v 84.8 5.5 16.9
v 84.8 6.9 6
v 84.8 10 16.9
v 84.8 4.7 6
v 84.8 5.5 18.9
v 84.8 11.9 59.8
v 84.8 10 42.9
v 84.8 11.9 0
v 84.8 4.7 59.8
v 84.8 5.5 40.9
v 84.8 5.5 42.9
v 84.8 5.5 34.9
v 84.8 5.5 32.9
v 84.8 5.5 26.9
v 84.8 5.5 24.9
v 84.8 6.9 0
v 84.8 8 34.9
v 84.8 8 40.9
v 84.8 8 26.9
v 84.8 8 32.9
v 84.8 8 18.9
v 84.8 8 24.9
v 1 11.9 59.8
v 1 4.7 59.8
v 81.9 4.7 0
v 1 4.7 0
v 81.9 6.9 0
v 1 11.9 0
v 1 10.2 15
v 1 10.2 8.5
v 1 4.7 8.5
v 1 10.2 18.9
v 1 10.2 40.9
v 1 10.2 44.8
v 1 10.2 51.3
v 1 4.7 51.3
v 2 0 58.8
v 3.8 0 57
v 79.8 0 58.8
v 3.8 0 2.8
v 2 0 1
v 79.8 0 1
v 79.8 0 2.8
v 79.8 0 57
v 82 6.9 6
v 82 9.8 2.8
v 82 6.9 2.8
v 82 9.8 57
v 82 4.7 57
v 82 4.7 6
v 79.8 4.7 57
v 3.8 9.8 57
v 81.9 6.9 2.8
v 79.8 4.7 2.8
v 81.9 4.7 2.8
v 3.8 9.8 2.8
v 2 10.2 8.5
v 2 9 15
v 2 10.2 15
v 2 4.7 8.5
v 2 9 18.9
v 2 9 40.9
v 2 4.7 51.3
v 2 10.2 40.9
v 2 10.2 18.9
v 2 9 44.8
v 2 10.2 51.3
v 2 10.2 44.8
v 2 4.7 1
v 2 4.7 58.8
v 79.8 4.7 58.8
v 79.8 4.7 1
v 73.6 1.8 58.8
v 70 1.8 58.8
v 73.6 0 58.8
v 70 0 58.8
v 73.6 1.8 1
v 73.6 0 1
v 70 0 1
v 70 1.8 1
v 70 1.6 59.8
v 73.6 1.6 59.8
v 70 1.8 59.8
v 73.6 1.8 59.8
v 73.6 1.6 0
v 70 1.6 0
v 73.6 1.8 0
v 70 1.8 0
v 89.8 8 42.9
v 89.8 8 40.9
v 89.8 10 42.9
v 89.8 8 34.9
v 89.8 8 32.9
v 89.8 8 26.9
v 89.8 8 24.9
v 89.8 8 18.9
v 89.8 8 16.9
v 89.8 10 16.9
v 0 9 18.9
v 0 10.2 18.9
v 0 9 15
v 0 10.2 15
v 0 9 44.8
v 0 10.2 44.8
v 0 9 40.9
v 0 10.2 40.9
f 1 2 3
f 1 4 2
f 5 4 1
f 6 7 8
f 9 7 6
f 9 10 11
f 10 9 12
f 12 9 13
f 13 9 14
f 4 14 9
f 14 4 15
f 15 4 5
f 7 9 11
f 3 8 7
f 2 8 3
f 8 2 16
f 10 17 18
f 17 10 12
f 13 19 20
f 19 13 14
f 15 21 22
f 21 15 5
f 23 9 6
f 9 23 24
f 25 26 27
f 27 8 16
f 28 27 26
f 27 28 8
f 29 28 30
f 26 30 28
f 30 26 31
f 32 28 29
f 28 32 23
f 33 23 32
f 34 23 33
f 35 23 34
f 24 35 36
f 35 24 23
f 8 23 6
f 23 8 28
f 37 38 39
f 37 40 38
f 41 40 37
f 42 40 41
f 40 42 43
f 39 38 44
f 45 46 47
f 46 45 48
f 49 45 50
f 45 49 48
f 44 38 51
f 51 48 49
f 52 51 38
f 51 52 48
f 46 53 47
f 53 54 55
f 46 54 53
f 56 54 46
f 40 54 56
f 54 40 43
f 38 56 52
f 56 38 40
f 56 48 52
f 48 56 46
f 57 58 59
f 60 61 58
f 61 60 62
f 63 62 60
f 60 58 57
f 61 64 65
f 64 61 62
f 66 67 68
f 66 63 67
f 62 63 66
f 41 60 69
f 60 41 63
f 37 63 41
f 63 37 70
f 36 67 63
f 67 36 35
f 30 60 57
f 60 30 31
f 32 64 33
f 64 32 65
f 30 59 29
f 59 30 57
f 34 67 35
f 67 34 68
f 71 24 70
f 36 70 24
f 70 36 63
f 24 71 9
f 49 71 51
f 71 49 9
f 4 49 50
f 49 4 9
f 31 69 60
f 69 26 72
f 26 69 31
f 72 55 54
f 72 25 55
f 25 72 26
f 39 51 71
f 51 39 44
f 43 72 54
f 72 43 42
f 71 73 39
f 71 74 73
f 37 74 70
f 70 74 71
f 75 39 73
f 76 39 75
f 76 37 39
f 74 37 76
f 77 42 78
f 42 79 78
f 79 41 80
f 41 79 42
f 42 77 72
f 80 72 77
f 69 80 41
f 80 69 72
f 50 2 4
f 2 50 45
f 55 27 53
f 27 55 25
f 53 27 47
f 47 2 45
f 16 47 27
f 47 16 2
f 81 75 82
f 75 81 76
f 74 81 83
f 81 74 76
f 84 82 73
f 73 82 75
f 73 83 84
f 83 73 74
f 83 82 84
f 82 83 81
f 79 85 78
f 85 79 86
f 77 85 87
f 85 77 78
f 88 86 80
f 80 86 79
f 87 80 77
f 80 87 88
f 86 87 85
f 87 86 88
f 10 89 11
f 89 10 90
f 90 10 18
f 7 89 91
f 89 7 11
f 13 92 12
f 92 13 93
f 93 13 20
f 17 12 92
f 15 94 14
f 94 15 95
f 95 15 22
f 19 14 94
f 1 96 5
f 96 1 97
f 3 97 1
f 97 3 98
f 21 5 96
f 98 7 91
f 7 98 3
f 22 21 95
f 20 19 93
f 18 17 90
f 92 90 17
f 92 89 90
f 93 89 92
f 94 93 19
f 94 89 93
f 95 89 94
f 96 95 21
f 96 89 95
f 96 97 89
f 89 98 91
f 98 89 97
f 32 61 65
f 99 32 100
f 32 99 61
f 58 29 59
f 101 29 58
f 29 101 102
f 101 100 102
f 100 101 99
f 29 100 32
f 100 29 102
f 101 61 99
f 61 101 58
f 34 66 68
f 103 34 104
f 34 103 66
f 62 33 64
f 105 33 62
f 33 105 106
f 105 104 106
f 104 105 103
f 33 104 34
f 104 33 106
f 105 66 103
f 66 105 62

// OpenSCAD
// SCAD model SIMATIC_IoT_2000_2020_2040_left_lid_cover_parametric, http://www.thingiverse.com/thing:2250534
// copyright (c) 2017 by Michael Dreher <michael(a)5dot1.de> is licensed under the Creative Commons - Attribution - Non-Commercial - Share Alike license. http://creativecommons.org/licenses/by-nc-nd/3.0/
// note for me: look at http://customizer.makerbot.com/docs for defining customizable parameters

// extra height for the top perimeter, should be a multiple of 0.2
topExtraHeight = 0; // [0:0.2:100]

// thickness of the top perimeter
topThickness = 2.1; // [0.6:0.2:5]

// thickness of the other perimeters
thickness = 1.8; // [1.2:0.1:3.9]

// if you want a hole for the MH-Z19 CO2 sensor in the top perimeter
withMHZ19SensorHole = 0; // [0:no, 1:top, 2:back, 3:front]

// if you want a hole for the Nokia 5110 LCD or a QVGA TFT display
withDisplay = 0; // [0:no_display, 1:Nokia5110, 2:QVGA]

// if you want a hole for a cable at the front.
withCableHole = 0; // [0:no, 1:yes]

// stop the parametric parser
if(0) {}

// my parameters
//topExtraHeight = 28; topThickness = 2.1; thickness = 1.8; withMHZ19SensorHole = 3; withDisplay = 2; withCableHole = 1;

module Triangle(x, h, overlap, thick)
{
    rotate([0, 90, 0])
    translate([-overlap, overlap, -thick / 2])
    linear_extrude(height = thick)
    polygon(points=[[0, 0], [h + overlap, 0], [h + overlap, -overlap], [overlap, -(x + overlap)], [0, -(x + overlap)]]);
}

module Tongue(x, y, z, thick, supportThick, supportCount=2)
{
    translate([-x/2, -y, -thick]) cube([x, y + overlap, thick]);

    if(supportCount < 2) {
        supportCount = 2;     
    }
    for (i = [0:supportCount - 1]) {
        sx = -(x - supportThick)/2 + i * (x - supportThick) / (supportCount - 1);  
        translate([sx, 0, -thick]) Triangle(y, z - thick, overlap, supportThick);
    }      
}

// the support has the whole width
module TongueSmall(x, y, z, thick)
{
    Tongue(x, y, z, thick, x/2 + overlap, 2);
}

module TongueBig(x, y, z, thick)
{
    Tongue(x, y, z, thick, thick, 4);
}

// originally taken from here: http://www.thingiverse.com/thing:9347
module roundedCube(size, radius)
{
    x = size[0];
    y = size[1];
    z = size[2];

    linear_extrude(height = z)
    hull()
    {
        // place 4 circles in the corners, with the given radius
        translate([radius, radius, 0])         circle(r = radius);
        translate([x - radius, radius, 0])     circle(r = radius);
        translate([radius, y - radius, 0])     circle(r = radius);
        translate([x - radius, y - radius, 0]) circle(r = radius);
    }
}

module Nokia_LCD_5110(thick = 5.1, sink = 0.8)
{
    // hole for the sensor
    center = true;
    top_corner_radius = 3.5;
    top_x = 36.4;
    top_y = 26.2;
    inner_x = 40.5;
    inner_y = 34.2;
    inner_y_dist = 1.4;
    pcb_x = 45.3;
    pcb_y = 45.3;
    pcb_z = 1.2;
    pcb_z_dist = 3.8;
    pcb_y_dist = inner_y_dist + 6;
    //y_dist = (inner_y - top_y) - 1.4;

    translate([center ? -top_x / 2 : 0, center ? -top_y / 2 : 0, 0])
    union()
    {
        //translate([0, 0, -(thick + o)]) cube([top_x, top_y, thick + 2*o]);
        translate([0, 0, -(thick + o)]) roundedCube([top_x, top_y, thick + 2*o], top_corner_radius); // rounded corners
        translate([-(inner_x - top_x) / 2, -inner_y_dist, -(thick + o)]) cube([inner_x, inner_y, thick - sink + o]);
        translate([-(pcb_x - top_x) / 2, -pcb_y_dist, -(pcb_z_dist + pcb_z)]) cube([pcb_x, pcb_y, pcb_z]);
    }
}

module QVGA_TFT(thick = 7.3, sink = 0.8)
{
    // hole for the sensor
    center = true;
    top_corner_radius = 1;
    top_x = 49 - 2;
    top_y = 37 - 2;
    inner_x = 55.4+0.4;
    inner_y = 40.2+0.2;
    inner_x_dist = 5.4 + 1;
    pcb_x = 67.5+0.2;
    pcb_y = 40.5+0.2;
    pcb_z = 1.7;
    pcb_z_dist = 2.6;
    pcb_x_dist = inner_x_dist + 8;

    translate([center ? -top_x / 2 : 0, center ? -top_y / 2 : 0, 0])
    union()
    {
        //translate([0, 0, -(thick + o)]) cube([top_x, top_y, thick + 2*o]);
        translate([0, 0, -(thick + o)]) roundedCube([top_x, top_y, thick + 2*o], top_corner_radius); // rounded corners
        translate([-inner_x_dist, -(inner_y - top_y) / 2, -(thick + o)]) cube([inner_x, inner_y, thick - sink + o]);
        translate([-pcb_x_dist, -(pcb_y - top_y) / 2, -(pcb_z_dist + pcb_z)]) cube([pcb_x, pcb_y, pcb_z]);
    }
}

module Cable_hole(d, h)
{
    translate([0, 0, - h/2])
    union()
    {
        cylinder(d=d, h = h + 2 * o, center=true);
    }
}

module MHZ19SensorHole_orig()
{
    // hole for the sensor
    size = 50;         
    sensor_x = 26.7;
    sensor_y = 19.8; // changed from 19.6; printed value was 19.3 for long part and 19.5 on short part 
    sensorAdd_x = 4.5;
    sensorAdd_width = 11.5;
    sensorAdd_height = 19.9 + 8;
    translate([40, -size/2,20]) cube([sensor_x, size + topExtraHeight, sensor_y]);
    translate([40 + sensorAdd_x, -size/2,20 + sensorAdd_height - sensor_y]) cube([sensorAdd_width, size + topExtraHeight, sensor_y]);
}

module MHZ19SensorHole()
{
    // hole for the sensor
    size = thickness + bottomLandingDepth + 2 * o;         
    sensor_x = 26.7;
    sensor_y = 19.8; // changed from 19.6; printed value was 19.3 for long part and 19.5 on short part 
    sensorAdd_x = 4.5;
    sensorAdd_width = 11.5;
    sensorAdd_height = 19.9 + 8;
    translate([0, -size/2, 0]) cube([sensor_x, size, sensor_y]);
    translate([sensorAdd_x, -size/2, 0 + sensorAdd_height - sensor_y]) cube([sensorAdd_width, size, sensor_y]);
}

module IoT2000_LeftLidCover()
{
    difference()
    {
        union()
        {
            // outer cube
            translate([1.00, 0, 0]) cube([width, depth + topExtraHeight, height]);
        }     

        // remove inner cube
        translate([leftLandingPinHeight + bottomLandingDepth + thickness, -o, bottomLandingDepth + thickness])
            cube([width - 2*(bottomLandingDepth + thickness), depth + topExtraHeight - topThickness + o, height - 2*(thickness + bottomLandingDepth)]);

        if(withMHZ19SensorHole == 1)
        {
            MHZ19SensorHole_orig();
        }
        else if(withMHZ19SensorHole == 2)
        {
            translate([10, 8, (thickness + bottomLandingDepth)/2])
            rotate([-90, 0, 0])
            MHZ19SensorHole();
        }
        else if(withMHZ19SensorHole == 3)
        {
            translate([10 + 26.7, 8, height - (thickness + bottomLandingDepth) + (thickness + bottomLandingDepth)/2])
            rotate([-90, 180, 0])
            MHZ19SensorHole();
        }

        if(withDisplay == 1)
        {
            translate([width / 2, depth + topExtraHeight, height / 2])
            rotate([-90, 0, 0])
            Nokia_LCD_5110(topThickness, 1.1);
        }
        else if(withDisplay == 2)
        {
            translate([5 + (width / 2), depth + topExtraHeight, height / 2])
            rotate([-90, 0, 0])
            QVGA_TFT(topThickness, 1.1);
        }
        
        if(withCableHole == 1)
        {
            translate([45, 15, height])
            Cable_hole(5, thickness + bottomLandingDepth);
        }
        
        // left Landing
        translate([-o, -o, (height - leftLandingWidth) / 2 ]) cube([o + leftLandingPinHeight + leftLandingDepth, o + leftLandingHeight, leftLandingWidth]);

        // bottom Landing
        translate([leftLandingPinHeight - o, -o, -o ]) cube([bottomLandingDepth + o, bottomLandingHeight + o, height + 2 * o]); // left
        translate([leftLandingPinHeight + width - bottomLandingDepthRight, -o, -o ]) cube([bottomLandingDepthRight + o, bottomLandingHeight + o, height + 2 * o]); // right; TODO: original is not using 90° but around 70° here
        translate([leftLandingPinHeight - o, -o, height - bottomLandingDepth]) cube([width + 2 * o, bottomLandingHeight + o, bottomLandingDepth + o]); // front
        translate([leftLandingPinHeight - o, -o, -o]) cube([width + 2 * o, bottomLandingHeight + o, bottomLandingDepth + o]); // back

        // right corner landing
        right_land_depth_min = 2.2 + 0.2;
        right_land_wid = 5.8 + 0.2;
        right_land_hei = 2 + 0.2;
        right_land_depth = max(thickness + bottomLandingDepth + overlap, right_land_depth_min);
        translate([leftLandingPinHeight + width - right_land_depth, bottomLandingHeight - o, -o]) cube([right_land_depth + o, right_land_hei + o, right_land_wid + o]);
    }
  
    // left pins
    translate([                   0, 9, (height - leftLandingWidthMid) / 2 - leftLandingPinWidth])
        cube([leftLandingPinHeight + leftLandingDepth + overlap, leftLandingPinDepth, leftLandingPinWidth]);
    translate([leftLandingPinHeight, 9 + leftLandingPinDepth - overlap, (height + leftLandingWidthMid) / 2                      ])
        cube([leftLandingDepth + overlap, 2 * overlap, leftLandingPinWidth]); // Y-overlap
    translate([                   0, 9, (height + leftLandingWidthMid) / 2                      ])                                 
        cube([leftLandingPinHeight + leftLandingDepth + overlap, leftLandingPinDepth, leftLandingPinWidth]);
    translate([leftLandingPinHeight, 9 + leftLandingPinDepth - overlap, (height - leftLandingWidthMid) / 2 - leftLandingPinWidth])
        cube([leftLandingDepth + overlap, 2 * overlap, leftLandingPinWidth]); // Y-overlap

    // tongue front
    translate([71.8, 1.8, height - bottomLandingDepth]) rotate([-90, 0, 0]) TongueSmall(3.6, 1, 1.8, 0.2);
    //translate([71.8, 1.8-0.1, height - bottomLandingDepth]) rotate([-90, 0, 180]) TongueSmall(3.6, 1, 1, 0.2);

    // tongue back
    translate([71.8, 1.8, bottomLandingDepth]) rotate([-90, 180, 0]) TongueSmall(3.6, 1, 1.8, 0.2);
    //translate([71.8, 1.8-0.1, bottomLandingDepth]) rotate([-90, 180, 180]) TongueSmall(3.6, 1, 1, 0.2);

    // tongue right
    translate([leftLandingPinHeight + width , 10, height/2]) rotate([-90, 90, 0]) TongueBig(26, 5, 4.5, 2);
}

// resolution
$fn = 100; // [50:medium, 100: high]
o = 1; // used to avoid edge collision when cutting material away
overlap = 0.1; // used to avoid edge collision when merging modules

height = 59.8;
width = 83.8;
depth = 12 - 0.1; // first layer is 0.3, all others are 0.2, so 12.0 is a number

// the landing on the left side
leftLandingPinWidth = 3.9;
leftLandingPinDepth = 1.2;
leftLandingPinHeight = 1;
leftLandingWidth = 42.8;
leftLandingHeight = 10.2;
leftLandingWidthMid = 22;
leftLandingWidthSide = (leftLandingWidth - leftLandingWidthMid - 2*leftLandingPinWidth) / 2;
leftLandingDepth = 1;

// the landings around on the bottom
bottomLandingHeight = 4.7;
bottomLandingDepth = 1;
bottomLandingDepthRight = 5;

IoT2000_LeftLidCover();
